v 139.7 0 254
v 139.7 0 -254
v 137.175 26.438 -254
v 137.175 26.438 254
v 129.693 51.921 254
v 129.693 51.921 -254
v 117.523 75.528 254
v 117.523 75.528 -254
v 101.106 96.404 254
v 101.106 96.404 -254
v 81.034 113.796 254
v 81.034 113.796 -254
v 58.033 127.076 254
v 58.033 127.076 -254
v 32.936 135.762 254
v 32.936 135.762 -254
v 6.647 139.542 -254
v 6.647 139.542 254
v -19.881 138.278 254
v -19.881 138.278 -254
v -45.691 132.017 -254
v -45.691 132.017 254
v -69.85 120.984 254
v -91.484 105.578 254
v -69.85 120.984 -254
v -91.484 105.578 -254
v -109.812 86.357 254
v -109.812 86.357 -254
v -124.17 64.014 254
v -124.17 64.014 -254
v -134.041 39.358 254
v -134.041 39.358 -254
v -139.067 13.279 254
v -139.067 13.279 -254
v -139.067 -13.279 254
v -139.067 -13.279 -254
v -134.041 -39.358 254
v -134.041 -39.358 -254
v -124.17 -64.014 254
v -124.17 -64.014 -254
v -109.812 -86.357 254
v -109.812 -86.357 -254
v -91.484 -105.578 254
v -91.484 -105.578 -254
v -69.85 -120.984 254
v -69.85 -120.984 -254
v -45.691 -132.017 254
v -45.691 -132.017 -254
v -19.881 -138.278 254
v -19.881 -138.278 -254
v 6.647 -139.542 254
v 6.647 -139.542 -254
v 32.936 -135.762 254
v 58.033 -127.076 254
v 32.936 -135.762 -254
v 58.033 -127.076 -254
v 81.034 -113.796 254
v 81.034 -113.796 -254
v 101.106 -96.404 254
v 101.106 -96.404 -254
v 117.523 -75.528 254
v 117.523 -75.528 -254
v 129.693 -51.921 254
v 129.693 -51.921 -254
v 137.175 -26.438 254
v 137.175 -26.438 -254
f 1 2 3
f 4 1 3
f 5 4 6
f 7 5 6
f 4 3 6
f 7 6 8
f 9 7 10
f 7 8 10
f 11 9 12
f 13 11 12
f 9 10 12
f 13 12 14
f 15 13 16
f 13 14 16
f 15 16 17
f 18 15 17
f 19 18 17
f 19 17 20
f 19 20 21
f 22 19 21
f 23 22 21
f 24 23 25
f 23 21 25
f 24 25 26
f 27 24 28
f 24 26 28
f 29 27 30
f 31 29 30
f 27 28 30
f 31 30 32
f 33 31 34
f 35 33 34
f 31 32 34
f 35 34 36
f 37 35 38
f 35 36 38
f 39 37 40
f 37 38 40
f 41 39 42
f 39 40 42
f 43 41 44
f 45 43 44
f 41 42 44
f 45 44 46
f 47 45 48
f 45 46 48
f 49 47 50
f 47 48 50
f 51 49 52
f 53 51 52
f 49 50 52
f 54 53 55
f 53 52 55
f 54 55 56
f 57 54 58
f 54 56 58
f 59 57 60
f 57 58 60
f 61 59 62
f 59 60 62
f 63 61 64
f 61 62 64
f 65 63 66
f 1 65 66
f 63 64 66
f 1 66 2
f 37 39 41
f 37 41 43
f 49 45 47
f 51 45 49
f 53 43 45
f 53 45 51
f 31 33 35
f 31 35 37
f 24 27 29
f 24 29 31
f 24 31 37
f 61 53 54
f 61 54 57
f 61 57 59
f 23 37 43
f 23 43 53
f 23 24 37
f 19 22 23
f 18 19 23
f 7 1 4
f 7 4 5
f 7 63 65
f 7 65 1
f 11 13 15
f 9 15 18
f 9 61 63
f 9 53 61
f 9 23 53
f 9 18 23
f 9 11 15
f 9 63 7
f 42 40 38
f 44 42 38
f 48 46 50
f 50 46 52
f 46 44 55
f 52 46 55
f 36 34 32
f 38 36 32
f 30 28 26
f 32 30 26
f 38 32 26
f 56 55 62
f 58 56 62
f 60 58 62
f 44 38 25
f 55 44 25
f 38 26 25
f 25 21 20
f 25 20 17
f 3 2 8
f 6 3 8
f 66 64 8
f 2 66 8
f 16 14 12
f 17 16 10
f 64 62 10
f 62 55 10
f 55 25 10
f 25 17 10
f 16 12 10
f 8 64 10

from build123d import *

# Parameters (mm, degrees)
FUSELAGE_START     = -254
FUSELAGE_OUTLINE_R = 139.7
FUSELAGE_DEPTH     = 508


# Read off the part's stored shape, not the designer's step: FuseLage
with BuildPart() as part:
    # FuseLage outline → FuseLage (new body)
    with BuildSketch(Plane.XY.offset(FUSELAGE_START)):
        Circle(FUSELAGE_OUTLINE_R)
    extrude(amount=FUSELAGE_DEPTH)


solid = part.part
